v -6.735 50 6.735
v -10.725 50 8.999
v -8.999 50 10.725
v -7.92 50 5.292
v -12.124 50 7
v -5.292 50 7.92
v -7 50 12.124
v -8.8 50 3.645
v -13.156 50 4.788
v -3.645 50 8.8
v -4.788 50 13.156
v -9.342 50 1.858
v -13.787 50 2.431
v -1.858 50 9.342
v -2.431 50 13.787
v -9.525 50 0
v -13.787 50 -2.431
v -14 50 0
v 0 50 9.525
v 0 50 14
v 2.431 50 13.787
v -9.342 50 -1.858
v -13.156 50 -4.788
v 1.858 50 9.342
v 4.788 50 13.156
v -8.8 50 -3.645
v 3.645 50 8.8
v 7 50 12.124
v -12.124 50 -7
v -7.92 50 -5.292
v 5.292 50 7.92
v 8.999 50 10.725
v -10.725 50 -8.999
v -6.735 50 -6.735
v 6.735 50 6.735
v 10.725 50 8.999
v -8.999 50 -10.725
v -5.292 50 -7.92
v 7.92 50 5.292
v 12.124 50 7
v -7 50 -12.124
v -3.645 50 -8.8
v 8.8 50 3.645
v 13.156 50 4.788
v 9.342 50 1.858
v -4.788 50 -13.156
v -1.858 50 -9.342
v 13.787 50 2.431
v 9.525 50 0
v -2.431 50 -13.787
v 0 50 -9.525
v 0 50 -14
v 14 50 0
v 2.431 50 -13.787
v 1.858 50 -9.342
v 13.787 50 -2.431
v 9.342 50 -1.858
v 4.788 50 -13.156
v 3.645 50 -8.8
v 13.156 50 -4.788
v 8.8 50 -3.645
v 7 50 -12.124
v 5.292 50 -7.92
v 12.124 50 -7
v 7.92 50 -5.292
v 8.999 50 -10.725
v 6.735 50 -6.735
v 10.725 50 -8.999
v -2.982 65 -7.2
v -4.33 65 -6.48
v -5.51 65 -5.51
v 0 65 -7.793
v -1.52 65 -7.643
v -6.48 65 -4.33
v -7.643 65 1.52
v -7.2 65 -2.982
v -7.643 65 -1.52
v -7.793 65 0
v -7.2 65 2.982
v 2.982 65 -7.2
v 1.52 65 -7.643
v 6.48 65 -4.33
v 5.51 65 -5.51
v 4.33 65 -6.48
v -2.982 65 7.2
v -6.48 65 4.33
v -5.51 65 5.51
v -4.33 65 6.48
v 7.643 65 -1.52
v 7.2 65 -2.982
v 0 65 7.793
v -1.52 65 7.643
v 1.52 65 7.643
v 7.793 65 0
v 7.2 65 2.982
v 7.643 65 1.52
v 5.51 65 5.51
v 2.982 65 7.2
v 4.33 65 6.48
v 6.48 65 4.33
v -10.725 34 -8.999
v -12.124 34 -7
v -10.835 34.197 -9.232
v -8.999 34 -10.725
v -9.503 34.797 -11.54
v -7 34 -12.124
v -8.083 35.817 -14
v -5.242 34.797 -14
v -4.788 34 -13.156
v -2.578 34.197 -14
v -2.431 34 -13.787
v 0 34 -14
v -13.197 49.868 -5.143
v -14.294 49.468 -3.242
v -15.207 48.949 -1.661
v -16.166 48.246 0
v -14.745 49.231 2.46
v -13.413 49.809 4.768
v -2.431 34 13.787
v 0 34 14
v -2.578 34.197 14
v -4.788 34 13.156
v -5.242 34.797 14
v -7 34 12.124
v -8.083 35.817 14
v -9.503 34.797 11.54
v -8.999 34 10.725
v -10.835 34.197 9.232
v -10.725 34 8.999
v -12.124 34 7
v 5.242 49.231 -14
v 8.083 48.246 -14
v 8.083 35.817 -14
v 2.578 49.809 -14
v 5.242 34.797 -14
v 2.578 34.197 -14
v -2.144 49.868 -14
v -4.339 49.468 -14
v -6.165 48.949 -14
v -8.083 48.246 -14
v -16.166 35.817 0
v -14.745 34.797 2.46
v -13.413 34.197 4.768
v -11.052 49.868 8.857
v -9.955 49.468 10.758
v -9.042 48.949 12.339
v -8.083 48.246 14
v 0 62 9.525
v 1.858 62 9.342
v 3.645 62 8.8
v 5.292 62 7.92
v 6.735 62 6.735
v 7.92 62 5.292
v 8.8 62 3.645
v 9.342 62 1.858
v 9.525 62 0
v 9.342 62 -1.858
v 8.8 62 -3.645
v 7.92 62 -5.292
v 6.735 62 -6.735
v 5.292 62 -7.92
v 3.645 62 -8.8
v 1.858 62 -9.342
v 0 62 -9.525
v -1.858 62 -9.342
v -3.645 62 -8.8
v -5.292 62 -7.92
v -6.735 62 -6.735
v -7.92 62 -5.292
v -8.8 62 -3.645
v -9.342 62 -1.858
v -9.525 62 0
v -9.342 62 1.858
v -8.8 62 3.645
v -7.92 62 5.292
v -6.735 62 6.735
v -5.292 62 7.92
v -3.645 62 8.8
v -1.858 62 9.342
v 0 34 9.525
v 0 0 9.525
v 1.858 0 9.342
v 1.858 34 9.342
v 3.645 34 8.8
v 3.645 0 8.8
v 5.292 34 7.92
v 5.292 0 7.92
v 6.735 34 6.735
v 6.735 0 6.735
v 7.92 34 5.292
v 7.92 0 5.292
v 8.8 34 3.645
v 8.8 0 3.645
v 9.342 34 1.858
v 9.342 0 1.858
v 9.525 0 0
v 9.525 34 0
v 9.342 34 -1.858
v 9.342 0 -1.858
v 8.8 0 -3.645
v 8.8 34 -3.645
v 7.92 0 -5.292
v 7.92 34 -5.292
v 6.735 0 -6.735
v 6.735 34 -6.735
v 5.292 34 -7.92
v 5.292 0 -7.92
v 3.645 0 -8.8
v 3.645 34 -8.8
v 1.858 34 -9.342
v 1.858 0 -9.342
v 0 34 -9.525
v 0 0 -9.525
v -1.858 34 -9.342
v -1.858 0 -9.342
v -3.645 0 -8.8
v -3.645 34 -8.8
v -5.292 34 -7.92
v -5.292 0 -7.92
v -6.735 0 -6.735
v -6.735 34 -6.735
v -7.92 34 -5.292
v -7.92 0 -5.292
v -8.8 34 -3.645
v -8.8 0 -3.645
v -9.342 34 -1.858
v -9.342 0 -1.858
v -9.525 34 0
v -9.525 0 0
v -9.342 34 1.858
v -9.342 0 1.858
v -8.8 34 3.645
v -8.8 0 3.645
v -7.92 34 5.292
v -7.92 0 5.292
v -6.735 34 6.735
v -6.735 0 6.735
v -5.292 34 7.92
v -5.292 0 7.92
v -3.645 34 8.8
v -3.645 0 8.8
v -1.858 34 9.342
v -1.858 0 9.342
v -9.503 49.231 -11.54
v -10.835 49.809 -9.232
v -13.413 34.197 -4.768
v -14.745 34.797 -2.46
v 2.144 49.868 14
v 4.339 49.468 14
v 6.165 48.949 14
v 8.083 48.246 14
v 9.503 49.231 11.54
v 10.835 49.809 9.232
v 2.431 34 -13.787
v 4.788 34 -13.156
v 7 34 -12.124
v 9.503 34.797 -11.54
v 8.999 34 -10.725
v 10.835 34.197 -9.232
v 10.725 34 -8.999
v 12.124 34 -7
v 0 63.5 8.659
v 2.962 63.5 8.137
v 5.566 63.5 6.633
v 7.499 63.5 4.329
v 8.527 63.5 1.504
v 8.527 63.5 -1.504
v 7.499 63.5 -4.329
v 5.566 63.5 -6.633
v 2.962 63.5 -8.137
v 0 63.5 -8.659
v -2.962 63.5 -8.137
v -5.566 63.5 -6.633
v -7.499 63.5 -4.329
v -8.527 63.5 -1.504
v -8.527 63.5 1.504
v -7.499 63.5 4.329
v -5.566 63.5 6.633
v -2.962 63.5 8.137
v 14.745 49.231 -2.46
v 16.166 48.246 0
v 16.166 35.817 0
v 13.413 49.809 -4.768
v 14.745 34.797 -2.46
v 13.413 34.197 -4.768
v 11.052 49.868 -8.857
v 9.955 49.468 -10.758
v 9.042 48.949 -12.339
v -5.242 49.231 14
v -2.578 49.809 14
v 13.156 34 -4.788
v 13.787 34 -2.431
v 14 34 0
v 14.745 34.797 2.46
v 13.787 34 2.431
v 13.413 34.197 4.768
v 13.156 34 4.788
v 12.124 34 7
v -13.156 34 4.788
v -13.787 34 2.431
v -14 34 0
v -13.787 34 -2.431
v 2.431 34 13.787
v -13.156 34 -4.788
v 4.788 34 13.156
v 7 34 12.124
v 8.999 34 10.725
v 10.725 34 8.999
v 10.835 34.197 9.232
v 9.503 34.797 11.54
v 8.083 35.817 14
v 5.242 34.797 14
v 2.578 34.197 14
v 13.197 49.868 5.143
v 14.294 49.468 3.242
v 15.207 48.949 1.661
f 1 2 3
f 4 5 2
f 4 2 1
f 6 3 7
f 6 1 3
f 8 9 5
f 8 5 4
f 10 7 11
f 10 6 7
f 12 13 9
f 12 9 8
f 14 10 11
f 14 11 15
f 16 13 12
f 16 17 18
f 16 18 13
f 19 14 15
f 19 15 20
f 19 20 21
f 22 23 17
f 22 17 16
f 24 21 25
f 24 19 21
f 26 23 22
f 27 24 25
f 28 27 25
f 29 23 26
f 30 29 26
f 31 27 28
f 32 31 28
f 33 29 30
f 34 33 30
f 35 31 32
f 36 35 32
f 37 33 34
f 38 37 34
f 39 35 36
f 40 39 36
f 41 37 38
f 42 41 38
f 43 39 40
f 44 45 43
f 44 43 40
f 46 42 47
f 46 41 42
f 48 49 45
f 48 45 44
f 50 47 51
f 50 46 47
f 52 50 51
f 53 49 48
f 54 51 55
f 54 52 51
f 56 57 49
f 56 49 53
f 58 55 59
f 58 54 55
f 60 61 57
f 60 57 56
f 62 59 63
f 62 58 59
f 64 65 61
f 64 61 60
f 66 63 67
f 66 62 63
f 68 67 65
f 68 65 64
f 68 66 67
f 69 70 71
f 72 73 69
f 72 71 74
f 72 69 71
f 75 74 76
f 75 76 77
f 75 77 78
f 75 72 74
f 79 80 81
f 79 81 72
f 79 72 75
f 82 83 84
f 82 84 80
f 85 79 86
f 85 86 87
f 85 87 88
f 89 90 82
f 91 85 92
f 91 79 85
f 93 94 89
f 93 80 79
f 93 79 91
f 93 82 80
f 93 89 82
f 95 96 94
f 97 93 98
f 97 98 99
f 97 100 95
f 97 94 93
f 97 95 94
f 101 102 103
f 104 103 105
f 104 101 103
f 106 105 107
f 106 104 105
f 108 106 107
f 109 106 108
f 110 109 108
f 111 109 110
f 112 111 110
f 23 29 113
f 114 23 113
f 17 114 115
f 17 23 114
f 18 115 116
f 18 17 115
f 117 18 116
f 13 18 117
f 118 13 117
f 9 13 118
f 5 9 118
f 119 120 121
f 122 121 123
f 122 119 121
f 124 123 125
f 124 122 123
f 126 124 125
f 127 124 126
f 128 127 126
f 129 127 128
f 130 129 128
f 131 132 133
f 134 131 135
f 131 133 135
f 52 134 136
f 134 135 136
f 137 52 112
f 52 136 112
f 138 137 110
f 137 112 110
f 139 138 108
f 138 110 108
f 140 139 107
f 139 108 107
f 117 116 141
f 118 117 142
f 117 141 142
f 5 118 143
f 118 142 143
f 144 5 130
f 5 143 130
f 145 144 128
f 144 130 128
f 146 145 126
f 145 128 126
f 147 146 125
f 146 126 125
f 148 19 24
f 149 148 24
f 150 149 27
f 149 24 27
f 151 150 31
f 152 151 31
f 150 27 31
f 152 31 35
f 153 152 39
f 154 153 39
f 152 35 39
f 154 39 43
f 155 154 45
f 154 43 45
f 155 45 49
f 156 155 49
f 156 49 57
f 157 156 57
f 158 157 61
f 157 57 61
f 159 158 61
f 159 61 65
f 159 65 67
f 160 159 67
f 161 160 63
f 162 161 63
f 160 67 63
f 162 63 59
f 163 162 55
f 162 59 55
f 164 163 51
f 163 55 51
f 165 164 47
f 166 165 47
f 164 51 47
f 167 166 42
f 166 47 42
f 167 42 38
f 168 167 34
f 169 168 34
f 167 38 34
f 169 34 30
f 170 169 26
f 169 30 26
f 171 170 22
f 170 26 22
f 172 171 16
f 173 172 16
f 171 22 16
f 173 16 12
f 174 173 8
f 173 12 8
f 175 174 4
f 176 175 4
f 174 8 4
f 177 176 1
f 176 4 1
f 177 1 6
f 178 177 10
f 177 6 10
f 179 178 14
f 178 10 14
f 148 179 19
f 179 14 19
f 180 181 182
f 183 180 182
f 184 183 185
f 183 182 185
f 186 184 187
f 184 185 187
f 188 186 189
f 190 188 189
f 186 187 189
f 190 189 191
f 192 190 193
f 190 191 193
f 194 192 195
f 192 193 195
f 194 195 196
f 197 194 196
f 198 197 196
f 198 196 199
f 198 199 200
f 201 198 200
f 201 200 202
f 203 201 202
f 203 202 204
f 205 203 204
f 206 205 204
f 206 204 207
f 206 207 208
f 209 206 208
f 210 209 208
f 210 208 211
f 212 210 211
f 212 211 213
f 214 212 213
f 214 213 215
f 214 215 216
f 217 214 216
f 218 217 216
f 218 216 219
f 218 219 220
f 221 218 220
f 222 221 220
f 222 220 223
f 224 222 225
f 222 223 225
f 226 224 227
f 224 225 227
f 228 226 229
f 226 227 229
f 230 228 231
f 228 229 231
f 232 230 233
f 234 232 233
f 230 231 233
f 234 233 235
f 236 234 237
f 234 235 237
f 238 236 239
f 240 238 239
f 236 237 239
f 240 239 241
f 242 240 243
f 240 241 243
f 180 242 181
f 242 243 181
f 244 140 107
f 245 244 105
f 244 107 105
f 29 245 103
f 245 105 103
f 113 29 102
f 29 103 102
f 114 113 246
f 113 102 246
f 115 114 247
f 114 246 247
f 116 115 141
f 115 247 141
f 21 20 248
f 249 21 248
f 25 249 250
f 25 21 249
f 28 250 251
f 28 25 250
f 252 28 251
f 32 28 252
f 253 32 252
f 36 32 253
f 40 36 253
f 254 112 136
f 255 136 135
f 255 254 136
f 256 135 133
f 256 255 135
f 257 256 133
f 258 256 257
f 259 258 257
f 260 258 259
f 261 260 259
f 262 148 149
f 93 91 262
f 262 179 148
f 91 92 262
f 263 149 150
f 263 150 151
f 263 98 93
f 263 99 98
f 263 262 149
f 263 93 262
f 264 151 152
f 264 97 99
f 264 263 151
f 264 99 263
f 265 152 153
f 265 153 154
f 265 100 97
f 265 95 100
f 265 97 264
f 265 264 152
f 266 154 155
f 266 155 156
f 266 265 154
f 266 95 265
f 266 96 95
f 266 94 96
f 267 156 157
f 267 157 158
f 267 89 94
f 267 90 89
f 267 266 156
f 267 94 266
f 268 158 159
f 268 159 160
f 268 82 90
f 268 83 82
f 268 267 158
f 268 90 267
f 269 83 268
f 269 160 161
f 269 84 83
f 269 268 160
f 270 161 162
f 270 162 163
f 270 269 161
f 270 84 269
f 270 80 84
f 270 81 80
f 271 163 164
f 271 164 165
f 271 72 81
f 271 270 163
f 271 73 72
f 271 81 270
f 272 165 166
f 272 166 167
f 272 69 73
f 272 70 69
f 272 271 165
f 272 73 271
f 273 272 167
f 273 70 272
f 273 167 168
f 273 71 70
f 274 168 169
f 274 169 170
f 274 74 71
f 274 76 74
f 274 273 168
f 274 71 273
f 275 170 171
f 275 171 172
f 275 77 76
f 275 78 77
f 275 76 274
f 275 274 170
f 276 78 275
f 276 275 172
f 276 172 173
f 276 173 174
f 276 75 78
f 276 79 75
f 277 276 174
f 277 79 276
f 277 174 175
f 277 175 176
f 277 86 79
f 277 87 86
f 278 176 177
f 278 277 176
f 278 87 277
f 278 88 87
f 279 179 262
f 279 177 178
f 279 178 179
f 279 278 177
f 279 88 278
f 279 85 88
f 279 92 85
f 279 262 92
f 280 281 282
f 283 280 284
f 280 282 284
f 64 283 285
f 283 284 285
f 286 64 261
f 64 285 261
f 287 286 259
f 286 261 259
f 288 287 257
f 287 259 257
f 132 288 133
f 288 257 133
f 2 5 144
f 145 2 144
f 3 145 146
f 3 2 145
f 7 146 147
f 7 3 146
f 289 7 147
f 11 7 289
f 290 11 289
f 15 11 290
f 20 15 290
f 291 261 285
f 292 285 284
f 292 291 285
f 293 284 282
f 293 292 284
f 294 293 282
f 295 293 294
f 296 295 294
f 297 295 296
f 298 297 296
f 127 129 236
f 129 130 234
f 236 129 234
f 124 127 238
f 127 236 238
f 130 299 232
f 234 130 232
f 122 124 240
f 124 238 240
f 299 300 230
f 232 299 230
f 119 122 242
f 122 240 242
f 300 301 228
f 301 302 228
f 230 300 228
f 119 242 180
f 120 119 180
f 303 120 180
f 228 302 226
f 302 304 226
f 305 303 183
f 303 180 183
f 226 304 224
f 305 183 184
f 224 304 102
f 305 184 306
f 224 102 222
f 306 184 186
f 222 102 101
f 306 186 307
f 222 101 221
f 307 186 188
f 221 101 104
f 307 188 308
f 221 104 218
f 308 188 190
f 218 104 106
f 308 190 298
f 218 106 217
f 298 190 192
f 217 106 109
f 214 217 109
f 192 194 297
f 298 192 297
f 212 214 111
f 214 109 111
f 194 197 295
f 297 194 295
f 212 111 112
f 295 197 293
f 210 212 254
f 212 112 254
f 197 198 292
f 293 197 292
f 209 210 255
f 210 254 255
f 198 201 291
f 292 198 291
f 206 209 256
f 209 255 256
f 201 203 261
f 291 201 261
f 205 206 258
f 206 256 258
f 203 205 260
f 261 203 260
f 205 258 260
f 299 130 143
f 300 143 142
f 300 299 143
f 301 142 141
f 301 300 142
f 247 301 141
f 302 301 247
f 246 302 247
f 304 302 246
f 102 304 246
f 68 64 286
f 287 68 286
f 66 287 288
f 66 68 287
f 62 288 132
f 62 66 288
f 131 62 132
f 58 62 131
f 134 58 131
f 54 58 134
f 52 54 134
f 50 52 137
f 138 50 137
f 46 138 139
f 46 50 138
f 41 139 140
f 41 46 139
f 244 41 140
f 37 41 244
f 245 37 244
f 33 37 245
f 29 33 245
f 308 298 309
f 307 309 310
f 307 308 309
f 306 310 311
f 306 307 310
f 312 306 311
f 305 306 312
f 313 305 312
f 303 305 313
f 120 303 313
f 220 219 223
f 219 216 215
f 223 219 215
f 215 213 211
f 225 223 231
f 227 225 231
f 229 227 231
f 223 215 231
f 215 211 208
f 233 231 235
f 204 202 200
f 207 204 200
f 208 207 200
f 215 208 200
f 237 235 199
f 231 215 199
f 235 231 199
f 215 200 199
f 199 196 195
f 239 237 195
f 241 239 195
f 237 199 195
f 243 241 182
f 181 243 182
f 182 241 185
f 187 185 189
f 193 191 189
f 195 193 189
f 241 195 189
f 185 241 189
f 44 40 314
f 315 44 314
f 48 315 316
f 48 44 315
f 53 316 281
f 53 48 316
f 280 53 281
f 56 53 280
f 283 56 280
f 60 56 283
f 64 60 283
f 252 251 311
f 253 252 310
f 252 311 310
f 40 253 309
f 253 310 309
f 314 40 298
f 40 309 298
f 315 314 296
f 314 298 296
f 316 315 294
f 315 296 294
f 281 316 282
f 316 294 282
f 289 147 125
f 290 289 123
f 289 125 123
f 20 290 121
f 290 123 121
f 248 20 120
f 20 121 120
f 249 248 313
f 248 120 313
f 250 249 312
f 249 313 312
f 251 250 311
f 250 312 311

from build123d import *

# Parameters (mm, degrees)
CROQUIS1_R              = 9.525
SALIENTE_EXTRUIR1_DEPTH = 50
SALIENTE_EXTRUIR2_START = -16
CROQUIS3_R              = 9.525
SALIENTE_EXTRUIR2_DEPTH = 16
CROQUIS4_R              = 9.525
SALIENTE_EXTRUIR3_DEPTH = 15
CHAFL_N1_SIZE           = 3
CHAFL_N1_SIZE2          = 1.732050808
CROQUIS5_R              = 52.693762875
CROQUIS5_R_2            = 14
CORTAR_EXTRUIR1_DEPTH   = 15
CORTAR_EXTRUIR1_DRAFT   = -51
CROQUIS6_R              = 45.15885801
CROQUIS6_R_2            = 14
CORTAR_EXTRUIR2_DEPTH   = 15
CORTAR_EXTRUIR2_DRAFT   = -50


with BuildPart() as part:
    # Croquis1 → Saliente-Extruir1 (new body)
    with BuildSketch(Plane(origin=(0, 0, 0), x_dir=(1, 0, 0), z_dir=(0, 1, 0))):
        with Locations(Location((0, 0, 0), (0, 0, 270))):
            Circle(CROQUIS1_R)
    extrude(amount=SALIENTE_EXTRUIR1_DEPTH)

    # Croquis3 → Saliente-Extruir2 (add)
    with BuildSketch(Plane(origin=(0, 50, 0), x_dir=(1, 0, 0), z_dir=(0, 1, 0)).offset(SALIENTE_EXTRUIR2_START)):
        Polygon((16.165807537, 0), (8.082903769, 14), (-8.082903769, 14), (-16.165807537, 0), (-8.082903769, -14), (8.082903769, -14), align=None)
        with Locations(Location((0, 0, 0), (0, 0, 270))):
            Circle(CROQUIS3_R, mode=Mode.SUBTRACT)
    extrude(amount=SALIENTE_EXTRUIR2_DEPTH)

    # Croquis4 → Saliente-Extruir3 (add)
    with BuildSketch(Plane(origin=(0, 50, 0), x_dir=(1, 0, 0), z_dir=(0, 1, 0))):
        with Locations(Location((0, 0, 0), (0, 0, 270))):
            Circle(CROQUIS4_R)
    extrude(amount=SALIENTE_EXTRUIR3_DEPTH)

    # Chaflán1
    chafl_n1_edges = [part.edges().sort_by_distance(p)[0] for p in [
        (0, 65, -9.525),
    ]]
    chafl_n1_side = [part.faces().sort_by_distance(p)[0] for p in [
        (0, 57.5, -9.525),
    ]]
    chamfer(chafl_n1_edges, length=CHAFL_N1_SIZE, length2=CHAFL_N1_SIZE2, reference=chafl_n1_side[0])


with BuildPart() as cortar_extruir1_tool:
    # Croquis5 → Cortar-Extruir1 (with draft: the straight prism first)
    with BuildSketch(Plane(origin=(0, 50, 0), x_dir=(1, 0, 0), z_dir=(0, 1, 0))):
        Circle(CROQUIS5_R)
        Circle(CROQUIS5_R_2, mode=Mode.SUBTRACT)
    extrude(amount=-CORTAR_EXTRUIR1_DEPTH)
    # Cortar-Extruir1: the draft: its side faces are tilted about the plane it starts from
    cortar_extruir1_sides = [cortar_extruir1_tool.faces().sort_by_distance(p)[0] for p in [
        (-52.693762875, 42.5, 0),
        (-14, 42.5, 0),
    ]]
    draft(cortar_extruir1_sides, Plane(origin=(0, 50, 0), x_dir=(1, 0, 0), z_dir=(0, 1, 0)), CORTAR_EXTRUIR1_DRAFT)


with BuildPart() as part_1:
    add(part.part)

    # Cortar-Extruir1: cut by cortar_extruir1_tool
    add(cortar_extruir1_tool.part, mode=Mode.SUBTRACT)


with BuildPart() as cortar_extruir2_tool:
    # Croquis6 → Cortar-Extruir2 (with draft: the straight prism first)
    with BuildSketch(Plane.XZ.offset(-34)):
        Circle(CROQUIS6_R)
        Circle(CROQUIS6_R_2, mode=Mode.SUBTRACT)
    extrude(amount=-CORTAR_EXTRUIR2_DEPTH)
    # Cortar-Extruir2: the draft: its side faces are tilted about the plane it starts from
    cortar_extruir2_sides = [cortar_extruir2_tool.faces().sort_by_distance(p)[0] for p in [
        (-45.15885801, 41.5, 0),
        (-14, 41.5, 0),
    ]]
    draft(cortar_extruir2_sides, Plane.XZ.offset(-34), CORTAR_EXTRUIR2_DRAFT)


with BuildPart() as part_2:
    add(part_1.part)

    # Cortar-Extruir2: cut by cortar_extruir2_tool
    add(cortar_extruir2_tool.part, mode=Mode.SUBTRACT)


solid = part_2.part
